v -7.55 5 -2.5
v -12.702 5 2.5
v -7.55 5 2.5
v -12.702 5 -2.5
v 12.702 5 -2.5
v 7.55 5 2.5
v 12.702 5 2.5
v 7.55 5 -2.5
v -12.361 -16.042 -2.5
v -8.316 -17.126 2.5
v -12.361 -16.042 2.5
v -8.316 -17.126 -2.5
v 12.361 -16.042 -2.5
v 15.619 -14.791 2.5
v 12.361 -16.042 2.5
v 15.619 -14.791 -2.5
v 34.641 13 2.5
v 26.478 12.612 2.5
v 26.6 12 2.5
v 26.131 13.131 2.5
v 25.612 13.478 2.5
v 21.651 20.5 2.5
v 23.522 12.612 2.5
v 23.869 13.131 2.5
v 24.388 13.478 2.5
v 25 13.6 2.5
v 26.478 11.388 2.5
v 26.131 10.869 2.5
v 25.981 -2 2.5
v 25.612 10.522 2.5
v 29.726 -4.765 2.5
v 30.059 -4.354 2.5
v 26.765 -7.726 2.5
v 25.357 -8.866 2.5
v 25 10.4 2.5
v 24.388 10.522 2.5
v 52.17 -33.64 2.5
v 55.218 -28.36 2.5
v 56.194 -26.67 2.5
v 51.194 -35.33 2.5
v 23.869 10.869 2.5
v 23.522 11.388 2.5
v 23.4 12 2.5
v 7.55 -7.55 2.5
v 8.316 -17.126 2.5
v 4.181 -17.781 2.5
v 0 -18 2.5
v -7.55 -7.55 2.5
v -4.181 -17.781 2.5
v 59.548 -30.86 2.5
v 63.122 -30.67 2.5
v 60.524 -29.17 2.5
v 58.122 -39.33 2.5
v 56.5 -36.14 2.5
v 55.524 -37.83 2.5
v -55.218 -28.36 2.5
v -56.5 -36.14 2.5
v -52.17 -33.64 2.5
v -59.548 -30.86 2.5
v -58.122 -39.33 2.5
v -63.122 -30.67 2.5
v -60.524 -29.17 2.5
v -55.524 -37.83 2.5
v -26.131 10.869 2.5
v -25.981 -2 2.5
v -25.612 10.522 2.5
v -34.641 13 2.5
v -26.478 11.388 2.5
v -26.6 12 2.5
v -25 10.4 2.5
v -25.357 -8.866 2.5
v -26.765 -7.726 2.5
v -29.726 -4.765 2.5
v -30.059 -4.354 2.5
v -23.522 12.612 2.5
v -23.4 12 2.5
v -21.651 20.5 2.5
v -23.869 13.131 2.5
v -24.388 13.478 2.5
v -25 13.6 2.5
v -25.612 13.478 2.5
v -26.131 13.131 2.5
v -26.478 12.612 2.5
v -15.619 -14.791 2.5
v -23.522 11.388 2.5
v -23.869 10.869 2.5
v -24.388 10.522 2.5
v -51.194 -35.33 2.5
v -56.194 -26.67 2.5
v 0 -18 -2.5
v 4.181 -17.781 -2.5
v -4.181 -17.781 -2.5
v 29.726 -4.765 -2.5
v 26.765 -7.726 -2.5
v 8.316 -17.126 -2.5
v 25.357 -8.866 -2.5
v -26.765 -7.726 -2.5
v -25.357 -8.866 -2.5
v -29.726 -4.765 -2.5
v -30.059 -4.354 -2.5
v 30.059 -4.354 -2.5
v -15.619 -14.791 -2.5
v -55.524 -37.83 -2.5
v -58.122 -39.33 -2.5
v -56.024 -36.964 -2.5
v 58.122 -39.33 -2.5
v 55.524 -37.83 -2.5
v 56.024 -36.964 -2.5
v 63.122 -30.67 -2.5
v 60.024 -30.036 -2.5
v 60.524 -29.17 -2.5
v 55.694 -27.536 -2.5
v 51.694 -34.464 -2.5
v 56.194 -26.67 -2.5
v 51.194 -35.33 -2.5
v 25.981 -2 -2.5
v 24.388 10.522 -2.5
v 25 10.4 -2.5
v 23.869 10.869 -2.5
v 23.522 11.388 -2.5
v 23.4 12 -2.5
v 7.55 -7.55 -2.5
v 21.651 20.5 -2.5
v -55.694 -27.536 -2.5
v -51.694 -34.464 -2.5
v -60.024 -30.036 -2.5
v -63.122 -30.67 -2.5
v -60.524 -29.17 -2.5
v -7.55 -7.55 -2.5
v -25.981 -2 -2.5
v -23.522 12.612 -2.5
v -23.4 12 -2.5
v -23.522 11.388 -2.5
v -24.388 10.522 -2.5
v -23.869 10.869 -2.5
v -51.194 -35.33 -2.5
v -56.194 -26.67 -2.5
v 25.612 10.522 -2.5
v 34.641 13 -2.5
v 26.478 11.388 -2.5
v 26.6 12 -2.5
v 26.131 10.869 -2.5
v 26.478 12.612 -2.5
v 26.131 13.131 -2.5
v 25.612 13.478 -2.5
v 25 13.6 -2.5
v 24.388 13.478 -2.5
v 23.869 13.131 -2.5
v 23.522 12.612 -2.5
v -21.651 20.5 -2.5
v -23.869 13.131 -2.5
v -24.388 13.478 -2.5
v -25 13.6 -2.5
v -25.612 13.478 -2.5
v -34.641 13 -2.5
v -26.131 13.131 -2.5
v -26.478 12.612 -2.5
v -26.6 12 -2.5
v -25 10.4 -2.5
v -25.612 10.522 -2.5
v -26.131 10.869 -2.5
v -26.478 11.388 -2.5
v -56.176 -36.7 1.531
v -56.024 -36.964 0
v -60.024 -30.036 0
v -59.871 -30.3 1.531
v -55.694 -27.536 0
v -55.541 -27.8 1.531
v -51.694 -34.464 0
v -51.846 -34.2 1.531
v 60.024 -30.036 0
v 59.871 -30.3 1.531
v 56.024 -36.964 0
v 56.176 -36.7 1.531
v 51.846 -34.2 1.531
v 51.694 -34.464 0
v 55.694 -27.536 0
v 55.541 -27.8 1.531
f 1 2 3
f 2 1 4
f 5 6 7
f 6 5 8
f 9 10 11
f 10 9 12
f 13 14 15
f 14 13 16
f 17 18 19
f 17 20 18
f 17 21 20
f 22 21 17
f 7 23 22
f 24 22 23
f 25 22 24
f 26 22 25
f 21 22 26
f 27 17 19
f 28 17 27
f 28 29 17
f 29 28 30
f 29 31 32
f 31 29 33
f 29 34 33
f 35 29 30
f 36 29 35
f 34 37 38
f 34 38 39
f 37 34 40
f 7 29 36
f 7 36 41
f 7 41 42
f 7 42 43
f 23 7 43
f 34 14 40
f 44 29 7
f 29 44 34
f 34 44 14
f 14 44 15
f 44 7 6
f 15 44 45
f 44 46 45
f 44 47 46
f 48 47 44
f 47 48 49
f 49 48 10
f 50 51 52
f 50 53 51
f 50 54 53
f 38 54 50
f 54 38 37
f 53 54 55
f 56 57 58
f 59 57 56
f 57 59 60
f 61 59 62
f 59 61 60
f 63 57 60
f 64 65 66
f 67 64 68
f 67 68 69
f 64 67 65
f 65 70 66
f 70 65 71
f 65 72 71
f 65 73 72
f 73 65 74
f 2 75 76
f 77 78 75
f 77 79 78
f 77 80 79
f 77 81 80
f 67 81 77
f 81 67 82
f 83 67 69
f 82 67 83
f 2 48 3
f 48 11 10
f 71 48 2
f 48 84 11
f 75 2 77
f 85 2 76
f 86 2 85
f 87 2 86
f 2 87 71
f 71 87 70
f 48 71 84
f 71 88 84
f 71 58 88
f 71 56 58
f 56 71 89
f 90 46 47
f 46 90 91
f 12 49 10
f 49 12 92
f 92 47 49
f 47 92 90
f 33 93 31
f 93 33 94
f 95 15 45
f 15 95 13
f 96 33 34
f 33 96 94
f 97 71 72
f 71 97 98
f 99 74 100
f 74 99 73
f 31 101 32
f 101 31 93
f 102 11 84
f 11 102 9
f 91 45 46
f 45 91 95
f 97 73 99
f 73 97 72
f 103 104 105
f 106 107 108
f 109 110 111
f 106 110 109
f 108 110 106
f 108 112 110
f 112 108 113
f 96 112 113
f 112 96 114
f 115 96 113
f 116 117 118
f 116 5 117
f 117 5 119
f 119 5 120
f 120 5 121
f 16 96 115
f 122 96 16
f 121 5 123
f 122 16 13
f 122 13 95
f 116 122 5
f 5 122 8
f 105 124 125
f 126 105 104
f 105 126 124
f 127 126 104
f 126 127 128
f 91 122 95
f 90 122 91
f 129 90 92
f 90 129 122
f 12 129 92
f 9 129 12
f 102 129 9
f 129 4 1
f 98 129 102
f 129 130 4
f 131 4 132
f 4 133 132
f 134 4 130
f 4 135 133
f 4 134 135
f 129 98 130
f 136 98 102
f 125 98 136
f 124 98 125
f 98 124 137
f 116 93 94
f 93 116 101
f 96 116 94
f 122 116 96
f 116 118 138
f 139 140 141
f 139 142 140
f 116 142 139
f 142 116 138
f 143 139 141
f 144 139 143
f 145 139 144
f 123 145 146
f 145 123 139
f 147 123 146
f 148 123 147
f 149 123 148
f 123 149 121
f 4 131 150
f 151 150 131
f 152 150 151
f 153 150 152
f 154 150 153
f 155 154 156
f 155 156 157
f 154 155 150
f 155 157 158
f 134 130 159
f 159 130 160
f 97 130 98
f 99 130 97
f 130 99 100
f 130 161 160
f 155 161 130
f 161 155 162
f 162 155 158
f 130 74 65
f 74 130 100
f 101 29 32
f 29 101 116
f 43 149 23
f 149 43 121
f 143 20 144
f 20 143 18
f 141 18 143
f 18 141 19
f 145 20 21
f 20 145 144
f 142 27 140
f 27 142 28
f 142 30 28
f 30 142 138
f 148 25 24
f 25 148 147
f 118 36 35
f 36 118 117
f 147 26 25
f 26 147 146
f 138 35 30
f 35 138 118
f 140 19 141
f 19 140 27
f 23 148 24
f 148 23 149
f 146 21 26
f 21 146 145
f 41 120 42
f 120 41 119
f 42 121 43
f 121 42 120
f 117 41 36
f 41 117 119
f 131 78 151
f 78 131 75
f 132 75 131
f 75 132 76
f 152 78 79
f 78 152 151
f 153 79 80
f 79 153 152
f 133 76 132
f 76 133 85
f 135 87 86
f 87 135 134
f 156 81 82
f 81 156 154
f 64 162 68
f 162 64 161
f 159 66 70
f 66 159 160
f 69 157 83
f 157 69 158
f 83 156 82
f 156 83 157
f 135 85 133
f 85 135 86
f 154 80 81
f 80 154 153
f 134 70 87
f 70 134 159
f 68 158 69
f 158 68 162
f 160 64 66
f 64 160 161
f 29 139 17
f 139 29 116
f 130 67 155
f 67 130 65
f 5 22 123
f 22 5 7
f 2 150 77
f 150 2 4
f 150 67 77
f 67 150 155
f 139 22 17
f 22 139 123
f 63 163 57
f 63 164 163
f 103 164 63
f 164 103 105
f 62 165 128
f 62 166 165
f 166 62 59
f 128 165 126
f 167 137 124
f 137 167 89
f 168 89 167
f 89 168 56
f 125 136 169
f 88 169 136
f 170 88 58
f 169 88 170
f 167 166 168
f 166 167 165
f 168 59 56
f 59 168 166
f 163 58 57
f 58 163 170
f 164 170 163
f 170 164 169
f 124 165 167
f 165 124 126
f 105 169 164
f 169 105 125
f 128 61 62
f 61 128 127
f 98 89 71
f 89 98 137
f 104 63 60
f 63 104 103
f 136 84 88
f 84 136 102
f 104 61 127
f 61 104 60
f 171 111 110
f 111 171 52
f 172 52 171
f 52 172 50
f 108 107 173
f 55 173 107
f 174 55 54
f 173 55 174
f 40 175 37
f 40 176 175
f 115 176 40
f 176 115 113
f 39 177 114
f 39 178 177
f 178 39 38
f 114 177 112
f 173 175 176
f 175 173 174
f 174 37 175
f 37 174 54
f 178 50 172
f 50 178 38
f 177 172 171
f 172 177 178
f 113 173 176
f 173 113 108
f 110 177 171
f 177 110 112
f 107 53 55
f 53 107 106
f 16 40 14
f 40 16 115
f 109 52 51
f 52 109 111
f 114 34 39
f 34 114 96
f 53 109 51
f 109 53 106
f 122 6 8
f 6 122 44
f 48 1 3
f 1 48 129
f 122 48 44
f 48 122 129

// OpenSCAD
openbeam_width = 15;
extrude_height = 5;
delta = 0.1;
$fn = 16;

module wing(width = 10, length = 70, height = 10,
        rot = 60,
        groovewidth = 5, groovedia = 8, grooverim = 3) {
    rotate([0, 0, 180-rot])
        difference() {
            translate([-width/2, 0, -height/2])
                cube([width, length, height]);
            translate([0,
                length - groovewidth/2 - grooverim, 0])
                rotate([-90, 0, 0]) {
                    difference() {
                        cube([width + delta,
                            height + delta,
                            groovewidth],
                            center = true);
                        cylinder(d = groovedia,
                            h = groovewidth + delta,
                            center = true);
                        translate([0, height/2, 0])
                            cube([groovedia,
                                height,
                                groovewidth + delta],
                                center = true);
                    }
                }
            }
}

module centerpiece(height = 5) {
    // derived from original kossel frame top
    union() {
        intersection() {
            translate([0, -10, 0])
                cube([100, 30, height+1],
                    center = true);
            translate([0, 22, 0])
                cylinder(r=40, h=height,
                    center=true, $fn=60);
            translate([0, -37, 0])
                rotate([0, 0, 30])
                    cylinder(r=50, h=height+1,
                        center=true, $fn=6);
        }
        translate([0, 38, 0])
            intersection() {
                difference() {
                    rotate([0, 0, -90])
                        cylinder(r=85, h=height,
                            center=true, $fn=3);
                    rotate([0, 0, -90])
                        cylinder(r=55, h=height+1,
                            center=true, $fn=3);

                    // screw holes (best guess,
                    // nonscientific placement)
                    for(a = [-1:2:1]) {
                        translate([-25*a, -26, 0])
                            cylinder(d = 3.2,
                                h = height + delta,
                                center = true);
                    }
                }

                // cut v of openbeam-emulating triangle
                translate([0, -20, 0])
                    cube([100, 40, height+1],
                        center=true);
                // square cut openbeam fingers
                translate([0, -55, 0])
                    rotate([0, 0, 30])
                        cylinder(r=50, h=height+1,
                            center=true, $fn=6);
            }
    }
}

module openbeam_cutout(width = 15, height) {
    union() {
        cube([width + delta,
            width + delta,
            height + delta],
            center = true);
        //translate([0, -width/2, 0])
        //    cube([width/2, width/2, height + delta],
        //        center = true);
    }
}

difference() {
    union() {
        centerpiece(height = extrude_height);
        wing(height = extrude_height);
        wing(height = extrude_height, rot=-60);
    }
    openbeam_cutout(width = openbeam_width,
        height = extrude_height);
}
